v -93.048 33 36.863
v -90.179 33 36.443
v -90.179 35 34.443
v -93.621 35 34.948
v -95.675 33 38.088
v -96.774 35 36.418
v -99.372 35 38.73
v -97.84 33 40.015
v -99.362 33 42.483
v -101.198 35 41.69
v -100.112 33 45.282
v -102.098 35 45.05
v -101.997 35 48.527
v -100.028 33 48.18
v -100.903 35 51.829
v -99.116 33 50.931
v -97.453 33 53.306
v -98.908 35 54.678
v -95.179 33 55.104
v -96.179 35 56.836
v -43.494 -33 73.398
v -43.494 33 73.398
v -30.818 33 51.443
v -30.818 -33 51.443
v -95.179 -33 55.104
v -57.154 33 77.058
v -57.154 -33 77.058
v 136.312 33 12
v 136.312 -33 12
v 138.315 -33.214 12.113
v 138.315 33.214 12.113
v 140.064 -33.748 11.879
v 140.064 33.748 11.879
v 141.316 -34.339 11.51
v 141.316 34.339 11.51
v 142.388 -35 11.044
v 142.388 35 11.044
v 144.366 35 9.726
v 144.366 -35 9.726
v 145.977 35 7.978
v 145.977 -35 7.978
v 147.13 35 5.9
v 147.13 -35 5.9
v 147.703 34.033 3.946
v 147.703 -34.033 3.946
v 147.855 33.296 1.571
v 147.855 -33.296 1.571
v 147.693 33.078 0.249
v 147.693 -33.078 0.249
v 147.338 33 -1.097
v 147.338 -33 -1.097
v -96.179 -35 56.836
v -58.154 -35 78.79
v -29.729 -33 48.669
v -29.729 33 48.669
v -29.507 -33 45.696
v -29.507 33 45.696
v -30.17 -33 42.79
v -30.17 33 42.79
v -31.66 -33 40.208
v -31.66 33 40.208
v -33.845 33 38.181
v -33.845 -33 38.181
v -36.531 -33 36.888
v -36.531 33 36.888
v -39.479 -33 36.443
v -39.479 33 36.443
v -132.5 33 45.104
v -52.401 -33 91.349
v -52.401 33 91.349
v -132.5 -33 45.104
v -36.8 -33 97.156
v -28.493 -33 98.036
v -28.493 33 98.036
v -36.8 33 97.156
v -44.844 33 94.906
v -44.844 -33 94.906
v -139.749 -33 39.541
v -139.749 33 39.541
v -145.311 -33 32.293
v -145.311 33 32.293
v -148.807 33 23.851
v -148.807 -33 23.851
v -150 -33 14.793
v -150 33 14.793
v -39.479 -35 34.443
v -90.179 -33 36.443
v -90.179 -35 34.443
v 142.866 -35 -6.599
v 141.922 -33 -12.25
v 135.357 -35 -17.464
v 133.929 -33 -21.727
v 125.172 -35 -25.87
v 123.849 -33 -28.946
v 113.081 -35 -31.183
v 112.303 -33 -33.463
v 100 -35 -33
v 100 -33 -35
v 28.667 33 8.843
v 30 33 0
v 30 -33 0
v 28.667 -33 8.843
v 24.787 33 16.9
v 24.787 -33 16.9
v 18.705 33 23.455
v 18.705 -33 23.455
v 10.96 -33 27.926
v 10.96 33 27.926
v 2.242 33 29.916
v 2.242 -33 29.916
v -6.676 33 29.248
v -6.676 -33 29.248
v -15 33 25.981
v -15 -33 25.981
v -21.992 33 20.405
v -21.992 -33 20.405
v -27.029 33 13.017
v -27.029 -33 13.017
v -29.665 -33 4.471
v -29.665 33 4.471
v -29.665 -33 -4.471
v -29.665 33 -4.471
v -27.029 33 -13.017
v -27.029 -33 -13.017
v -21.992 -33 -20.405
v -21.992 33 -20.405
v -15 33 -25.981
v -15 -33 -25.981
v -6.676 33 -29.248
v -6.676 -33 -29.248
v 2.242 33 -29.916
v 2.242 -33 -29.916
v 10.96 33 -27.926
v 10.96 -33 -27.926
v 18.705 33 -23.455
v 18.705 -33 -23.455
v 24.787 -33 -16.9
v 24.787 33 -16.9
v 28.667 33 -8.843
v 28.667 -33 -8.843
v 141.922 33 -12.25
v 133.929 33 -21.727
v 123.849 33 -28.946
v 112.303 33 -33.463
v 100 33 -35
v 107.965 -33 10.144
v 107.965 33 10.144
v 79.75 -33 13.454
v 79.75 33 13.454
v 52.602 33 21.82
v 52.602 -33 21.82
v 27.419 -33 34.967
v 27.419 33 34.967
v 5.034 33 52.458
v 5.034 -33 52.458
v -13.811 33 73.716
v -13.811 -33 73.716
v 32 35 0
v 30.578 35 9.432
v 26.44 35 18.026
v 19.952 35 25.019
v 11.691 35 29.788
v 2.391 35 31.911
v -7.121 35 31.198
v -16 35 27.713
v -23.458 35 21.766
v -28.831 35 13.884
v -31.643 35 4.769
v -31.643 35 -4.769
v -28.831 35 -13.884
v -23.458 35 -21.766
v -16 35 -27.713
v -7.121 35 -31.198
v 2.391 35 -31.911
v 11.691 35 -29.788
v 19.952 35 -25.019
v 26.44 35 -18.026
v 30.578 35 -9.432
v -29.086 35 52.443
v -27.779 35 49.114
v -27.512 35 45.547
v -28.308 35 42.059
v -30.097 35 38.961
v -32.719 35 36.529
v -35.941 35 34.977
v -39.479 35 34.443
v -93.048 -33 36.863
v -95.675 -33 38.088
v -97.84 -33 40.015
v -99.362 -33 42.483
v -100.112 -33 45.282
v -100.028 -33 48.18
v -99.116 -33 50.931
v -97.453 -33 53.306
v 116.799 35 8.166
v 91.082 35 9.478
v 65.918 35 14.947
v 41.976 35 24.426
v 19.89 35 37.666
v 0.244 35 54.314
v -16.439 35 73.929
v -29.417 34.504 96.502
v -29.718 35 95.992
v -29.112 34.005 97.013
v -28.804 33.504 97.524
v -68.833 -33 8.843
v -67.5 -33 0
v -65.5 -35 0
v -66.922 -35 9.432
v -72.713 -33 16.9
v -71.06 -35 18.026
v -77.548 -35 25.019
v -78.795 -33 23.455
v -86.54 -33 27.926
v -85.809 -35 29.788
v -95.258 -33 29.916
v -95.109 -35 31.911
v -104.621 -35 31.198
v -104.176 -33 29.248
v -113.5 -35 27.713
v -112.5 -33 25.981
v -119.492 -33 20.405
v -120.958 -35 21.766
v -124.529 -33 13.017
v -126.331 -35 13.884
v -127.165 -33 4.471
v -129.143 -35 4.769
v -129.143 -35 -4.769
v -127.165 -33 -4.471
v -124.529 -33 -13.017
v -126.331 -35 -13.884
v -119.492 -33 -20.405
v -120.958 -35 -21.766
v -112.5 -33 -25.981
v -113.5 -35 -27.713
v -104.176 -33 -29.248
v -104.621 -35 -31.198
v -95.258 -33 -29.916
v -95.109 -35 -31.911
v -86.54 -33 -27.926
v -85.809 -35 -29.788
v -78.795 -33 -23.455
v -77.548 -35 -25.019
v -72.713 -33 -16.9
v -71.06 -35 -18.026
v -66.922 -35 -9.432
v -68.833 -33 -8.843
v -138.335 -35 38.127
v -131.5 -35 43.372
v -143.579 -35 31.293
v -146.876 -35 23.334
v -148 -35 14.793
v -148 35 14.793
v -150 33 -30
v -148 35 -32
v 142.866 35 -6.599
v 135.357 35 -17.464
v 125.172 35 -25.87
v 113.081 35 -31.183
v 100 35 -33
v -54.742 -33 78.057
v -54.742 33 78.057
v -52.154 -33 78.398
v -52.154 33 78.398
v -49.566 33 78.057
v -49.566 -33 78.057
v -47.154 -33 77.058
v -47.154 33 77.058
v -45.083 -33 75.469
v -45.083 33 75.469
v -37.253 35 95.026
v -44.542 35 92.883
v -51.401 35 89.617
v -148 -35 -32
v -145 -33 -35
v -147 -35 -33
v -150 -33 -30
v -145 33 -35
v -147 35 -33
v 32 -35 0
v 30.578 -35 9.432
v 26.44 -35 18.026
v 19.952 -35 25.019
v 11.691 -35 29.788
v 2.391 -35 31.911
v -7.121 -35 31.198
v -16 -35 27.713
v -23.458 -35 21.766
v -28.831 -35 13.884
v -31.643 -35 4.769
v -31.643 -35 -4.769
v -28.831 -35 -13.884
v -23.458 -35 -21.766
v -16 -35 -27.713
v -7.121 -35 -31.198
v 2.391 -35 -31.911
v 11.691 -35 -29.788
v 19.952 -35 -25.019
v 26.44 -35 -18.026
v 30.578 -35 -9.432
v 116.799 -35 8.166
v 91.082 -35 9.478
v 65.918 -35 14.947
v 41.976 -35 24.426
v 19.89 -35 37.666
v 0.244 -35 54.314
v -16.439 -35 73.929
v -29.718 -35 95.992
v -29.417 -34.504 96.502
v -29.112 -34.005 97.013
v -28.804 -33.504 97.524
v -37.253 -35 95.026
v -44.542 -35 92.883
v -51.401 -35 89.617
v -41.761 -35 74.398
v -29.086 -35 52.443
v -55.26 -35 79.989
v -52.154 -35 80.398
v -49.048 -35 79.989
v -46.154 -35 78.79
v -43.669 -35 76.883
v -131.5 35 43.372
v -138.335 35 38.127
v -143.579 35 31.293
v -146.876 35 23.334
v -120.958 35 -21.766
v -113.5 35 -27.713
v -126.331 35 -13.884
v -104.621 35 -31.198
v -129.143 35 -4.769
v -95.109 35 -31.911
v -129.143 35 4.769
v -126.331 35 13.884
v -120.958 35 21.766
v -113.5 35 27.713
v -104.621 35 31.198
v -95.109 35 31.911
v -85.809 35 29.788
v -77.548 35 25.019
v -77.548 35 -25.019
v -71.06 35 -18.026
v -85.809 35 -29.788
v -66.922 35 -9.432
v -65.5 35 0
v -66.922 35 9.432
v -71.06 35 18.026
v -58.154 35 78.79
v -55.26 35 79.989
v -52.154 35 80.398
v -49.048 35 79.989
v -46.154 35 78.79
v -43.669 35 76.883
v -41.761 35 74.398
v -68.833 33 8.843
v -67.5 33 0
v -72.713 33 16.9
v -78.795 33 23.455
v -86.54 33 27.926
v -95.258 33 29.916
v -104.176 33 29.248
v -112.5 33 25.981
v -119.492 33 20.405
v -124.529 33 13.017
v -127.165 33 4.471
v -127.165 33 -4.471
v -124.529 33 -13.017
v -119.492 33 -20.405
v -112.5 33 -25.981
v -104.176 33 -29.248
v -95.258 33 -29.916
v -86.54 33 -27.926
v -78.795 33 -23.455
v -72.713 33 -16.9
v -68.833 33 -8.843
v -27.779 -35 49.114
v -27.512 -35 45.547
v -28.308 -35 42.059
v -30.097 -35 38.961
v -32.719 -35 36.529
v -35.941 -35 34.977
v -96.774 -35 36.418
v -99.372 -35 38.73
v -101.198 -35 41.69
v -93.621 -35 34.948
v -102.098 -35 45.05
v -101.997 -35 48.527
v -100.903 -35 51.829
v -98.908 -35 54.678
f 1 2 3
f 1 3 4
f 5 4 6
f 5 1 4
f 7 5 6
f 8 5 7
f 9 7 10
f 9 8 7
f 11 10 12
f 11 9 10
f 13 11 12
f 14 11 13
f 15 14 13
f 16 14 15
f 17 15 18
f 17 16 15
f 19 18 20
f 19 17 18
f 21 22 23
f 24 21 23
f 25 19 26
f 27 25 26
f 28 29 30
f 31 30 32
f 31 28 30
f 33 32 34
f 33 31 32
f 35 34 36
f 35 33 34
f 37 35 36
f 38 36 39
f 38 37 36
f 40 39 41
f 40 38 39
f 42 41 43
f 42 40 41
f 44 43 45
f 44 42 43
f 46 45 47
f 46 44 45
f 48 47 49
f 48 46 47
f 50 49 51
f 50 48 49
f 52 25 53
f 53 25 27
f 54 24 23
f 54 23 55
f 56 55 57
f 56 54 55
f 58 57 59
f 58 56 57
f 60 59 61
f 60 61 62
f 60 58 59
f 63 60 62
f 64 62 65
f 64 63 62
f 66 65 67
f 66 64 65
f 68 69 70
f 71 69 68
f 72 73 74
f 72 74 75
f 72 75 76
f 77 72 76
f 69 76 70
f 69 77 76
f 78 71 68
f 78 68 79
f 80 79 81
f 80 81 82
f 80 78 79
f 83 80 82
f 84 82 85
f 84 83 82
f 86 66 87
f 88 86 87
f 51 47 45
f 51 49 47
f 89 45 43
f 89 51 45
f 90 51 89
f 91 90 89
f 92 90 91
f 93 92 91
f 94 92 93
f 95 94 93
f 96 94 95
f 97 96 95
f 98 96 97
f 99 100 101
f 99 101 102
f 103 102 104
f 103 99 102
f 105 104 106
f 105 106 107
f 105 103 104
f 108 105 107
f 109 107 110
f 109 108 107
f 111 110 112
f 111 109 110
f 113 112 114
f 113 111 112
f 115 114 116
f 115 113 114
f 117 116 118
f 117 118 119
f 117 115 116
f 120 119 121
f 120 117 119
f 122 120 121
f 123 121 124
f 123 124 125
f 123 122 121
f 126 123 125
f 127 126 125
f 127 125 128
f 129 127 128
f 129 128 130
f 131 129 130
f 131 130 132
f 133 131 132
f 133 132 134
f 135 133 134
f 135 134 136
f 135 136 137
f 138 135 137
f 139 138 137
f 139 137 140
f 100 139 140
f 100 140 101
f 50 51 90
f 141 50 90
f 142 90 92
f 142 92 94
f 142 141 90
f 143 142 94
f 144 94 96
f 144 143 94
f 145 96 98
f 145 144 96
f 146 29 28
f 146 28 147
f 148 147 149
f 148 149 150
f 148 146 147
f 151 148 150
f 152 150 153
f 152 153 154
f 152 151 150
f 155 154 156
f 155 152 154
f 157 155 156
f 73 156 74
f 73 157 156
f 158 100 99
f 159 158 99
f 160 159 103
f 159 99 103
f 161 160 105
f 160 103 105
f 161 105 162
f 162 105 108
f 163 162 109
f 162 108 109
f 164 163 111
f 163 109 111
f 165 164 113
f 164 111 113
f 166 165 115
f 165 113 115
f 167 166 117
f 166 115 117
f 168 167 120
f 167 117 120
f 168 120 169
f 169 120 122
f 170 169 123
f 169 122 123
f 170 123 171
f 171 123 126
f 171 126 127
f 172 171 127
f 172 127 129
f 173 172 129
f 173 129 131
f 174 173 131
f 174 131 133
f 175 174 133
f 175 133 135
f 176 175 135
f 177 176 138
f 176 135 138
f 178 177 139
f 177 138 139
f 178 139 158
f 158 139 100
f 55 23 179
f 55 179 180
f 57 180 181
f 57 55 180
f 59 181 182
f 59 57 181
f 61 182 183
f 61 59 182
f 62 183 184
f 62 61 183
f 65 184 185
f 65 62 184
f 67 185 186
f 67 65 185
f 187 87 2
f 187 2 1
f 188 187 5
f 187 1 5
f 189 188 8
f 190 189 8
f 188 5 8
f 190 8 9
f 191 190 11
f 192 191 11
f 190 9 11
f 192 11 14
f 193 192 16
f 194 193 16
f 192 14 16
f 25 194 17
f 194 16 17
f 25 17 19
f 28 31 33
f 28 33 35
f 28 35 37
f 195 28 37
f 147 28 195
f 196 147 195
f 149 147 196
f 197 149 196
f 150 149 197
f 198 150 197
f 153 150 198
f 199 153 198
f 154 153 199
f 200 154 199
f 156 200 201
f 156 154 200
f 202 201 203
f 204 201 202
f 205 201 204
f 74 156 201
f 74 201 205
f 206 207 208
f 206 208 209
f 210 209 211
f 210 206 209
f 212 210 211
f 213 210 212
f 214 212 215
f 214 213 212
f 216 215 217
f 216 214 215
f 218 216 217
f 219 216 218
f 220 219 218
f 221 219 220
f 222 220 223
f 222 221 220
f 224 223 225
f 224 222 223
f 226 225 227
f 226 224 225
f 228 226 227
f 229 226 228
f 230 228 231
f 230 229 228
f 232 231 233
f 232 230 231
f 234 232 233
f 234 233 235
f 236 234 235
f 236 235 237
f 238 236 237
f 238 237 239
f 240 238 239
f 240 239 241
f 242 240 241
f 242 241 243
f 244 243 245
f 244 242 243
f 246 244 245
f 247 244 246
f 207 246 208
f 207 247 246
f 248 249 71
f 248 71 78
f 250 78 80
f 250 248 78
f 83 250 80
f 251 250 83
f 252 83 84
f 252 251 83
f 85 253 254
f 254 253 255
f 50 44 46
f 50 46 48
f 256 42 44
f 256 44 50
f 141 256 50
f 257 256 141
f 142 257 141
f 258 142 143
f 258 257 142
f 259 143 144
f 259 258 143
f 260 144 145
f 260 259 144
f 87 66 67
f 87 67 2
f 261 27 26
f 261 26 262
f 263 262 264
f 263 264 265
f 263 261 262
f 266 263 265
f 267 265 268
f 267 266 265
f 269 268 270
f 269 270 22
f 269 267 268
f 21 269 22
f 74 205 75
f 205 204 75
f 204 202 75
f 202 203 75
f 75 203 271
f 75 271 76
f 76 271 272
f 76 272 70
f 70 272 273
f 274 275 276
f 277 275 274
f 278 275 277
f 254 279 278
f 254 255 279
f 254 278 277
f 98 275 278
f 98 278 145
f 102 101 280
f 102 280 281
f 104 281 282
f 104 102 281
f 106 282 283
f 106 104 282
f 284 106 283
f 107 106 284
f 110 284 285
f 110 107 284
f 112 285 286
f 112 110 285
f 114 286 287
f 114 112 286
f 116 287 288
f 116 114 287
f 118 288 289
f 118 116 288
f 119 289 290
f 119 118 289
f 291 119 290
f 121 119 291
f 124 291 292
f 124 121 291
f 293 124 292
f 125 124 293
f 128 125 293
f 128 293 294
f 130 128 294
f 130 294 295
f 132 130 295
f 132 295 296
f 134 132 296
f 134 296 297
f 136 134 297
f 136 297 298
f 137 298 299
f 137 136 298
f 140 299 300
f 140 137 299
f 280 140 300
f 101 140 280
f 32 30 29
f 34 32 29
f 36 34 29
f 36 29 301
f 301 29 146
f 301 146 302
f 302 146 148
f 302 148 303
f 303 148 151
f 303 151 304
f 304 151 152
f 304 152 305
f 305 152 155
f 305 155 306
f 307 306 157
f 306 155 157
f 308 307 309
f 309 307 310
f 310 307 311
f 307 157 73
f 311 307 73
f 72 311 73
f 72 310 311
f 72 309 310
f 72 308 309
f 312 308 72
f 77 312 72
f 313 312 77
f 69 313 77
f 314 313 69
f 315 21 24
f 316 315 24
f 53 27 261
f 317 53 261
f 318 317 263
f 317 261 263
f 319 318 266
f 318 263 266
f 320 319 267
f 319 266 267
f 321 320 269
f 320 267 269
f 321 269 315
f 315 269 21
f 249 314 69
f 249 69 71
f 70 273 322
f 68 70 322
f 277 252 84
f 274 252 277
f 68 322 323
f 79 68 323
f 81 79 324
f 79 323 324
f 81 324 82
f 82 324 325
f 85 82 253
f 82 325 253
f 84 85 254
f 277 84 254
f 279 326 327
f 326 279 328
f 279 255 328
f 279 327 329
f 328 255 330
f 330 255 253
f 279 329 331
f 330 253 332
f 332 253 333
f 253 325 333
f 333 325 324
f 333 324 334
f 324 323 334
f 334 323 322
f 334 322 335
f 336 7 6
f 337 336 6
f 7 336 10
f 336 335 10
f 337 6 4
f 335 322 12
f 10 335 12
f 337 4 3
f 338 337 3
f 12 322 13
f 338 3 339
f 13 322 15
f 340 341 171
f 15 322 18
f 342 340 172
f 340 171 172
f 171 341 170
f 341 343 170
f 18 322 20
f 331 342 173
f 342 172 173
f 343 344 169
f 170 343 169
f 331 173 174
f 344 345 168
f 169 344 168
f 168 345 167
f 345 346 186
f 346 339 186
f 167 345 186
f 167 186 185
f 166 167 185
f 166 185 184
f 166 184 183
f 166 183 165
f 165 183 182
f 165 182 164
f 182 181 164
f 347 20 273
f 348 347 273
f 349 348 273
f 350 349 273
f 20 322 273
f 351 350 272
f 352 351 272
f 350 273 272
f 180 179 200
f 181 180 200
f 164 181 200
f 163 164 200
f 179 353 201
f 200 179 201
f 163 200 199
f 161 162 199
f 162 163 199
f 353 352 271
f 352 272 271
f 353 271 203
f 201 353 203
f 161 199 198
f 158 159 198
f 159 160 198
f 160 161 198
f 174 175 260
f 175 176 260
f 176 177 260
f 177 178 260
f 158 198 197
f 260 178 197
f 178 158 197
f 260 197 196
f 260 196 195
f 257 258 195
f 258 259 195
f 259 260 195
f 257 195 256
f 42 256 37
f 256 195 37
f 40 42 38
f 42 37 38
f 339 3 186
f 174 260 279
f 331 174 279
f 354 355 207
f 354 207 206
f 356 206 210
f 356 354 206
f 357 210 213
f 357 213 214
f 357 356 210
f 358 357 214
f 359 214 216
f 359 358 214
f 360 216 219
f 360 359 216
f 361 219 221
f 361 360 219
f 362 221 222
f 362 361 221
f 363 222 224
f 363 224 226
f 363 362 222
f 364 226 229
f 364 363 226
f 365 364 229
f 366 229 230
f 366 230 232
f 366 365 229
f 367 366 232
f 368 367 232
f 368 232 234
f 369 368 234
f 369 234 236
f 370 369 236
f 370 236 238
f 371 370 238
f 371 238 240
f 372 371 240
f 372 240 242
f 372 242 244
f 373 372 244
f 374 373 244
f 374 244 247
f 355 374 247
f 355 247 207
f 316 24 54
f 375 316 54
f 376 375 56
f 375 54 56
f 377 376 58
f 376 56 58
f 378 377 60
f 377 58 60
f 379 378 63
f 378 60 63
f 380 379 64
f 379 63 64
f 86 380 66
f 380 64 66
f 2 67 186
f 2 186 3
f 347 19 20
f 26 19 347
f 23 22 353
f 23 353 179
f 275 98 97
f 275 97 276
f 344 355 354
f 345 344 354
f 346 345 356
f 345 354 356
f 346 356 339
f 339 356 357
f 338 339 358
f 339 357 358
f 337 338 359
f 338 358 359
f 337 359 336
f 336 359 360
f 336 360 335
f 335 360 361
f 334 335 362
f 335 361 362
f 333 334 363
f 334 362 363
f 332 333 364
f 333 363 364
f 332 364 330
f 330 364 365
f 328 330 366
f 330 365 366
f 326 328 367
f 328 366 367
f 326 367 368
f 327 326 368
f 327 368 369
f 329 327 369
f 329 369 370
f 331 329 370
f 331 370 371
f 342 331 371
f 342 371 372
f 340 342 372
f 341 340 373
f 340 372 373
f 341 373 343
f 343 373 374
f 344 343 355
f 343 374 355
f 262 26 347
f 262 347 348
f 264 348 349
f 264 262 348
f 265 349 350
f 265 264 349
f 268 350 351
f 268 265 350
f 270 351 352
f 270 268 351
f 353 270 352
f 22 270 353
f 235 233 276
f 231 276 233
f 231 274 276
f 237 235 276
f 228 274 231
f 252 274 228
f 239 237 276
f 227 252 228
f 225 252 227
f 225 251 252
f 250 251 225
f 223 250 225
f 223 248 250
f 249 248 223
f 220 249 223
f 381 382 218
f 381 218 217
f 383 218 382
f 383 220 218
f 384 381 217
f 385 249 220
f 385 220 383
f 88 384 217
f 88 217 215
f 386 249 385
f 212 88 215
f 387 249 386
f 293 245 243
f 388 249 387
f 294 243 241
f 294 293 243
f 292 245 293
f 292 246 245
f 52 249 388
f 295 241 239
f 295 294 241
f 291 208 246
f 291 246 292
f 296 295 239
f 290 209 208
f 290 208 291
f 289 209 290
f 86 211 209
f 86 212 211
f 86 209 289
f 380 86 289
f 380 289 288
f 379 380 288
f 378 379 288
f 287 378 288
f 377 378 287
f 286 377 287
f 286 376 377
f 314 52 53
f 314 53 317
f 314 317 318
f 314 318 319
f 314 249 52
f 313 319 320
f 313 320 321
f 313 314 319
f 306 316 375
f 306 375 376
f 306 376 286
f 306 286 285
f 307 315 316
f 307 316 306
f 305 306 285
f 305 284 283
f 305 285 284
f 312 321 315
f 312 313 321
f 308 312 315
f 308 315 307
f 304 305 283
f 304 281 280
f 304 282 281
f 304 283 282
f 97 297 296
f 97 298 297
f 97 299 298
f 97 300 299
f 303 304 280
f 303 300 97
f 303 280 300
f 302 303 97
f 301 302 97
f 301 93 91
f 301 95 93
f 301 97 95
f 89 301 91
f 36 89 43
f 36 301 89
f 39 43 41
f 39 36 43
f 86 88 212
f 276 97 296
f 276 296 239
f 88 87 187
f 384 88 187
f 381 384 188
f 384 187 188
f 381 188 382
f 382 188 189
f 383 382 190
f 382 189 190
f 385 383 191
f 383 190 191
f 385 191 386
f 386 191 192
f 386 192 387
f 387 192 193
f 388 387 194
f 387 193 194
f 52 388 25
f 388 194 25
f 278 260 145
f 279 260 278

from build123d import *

# Parameters (mm, degrees)
F0_R        = 30
F1_DEPTH    = 35
F2_T1_DEPTH = 320
F3_SIZE     = 2
F4_T1_DEPTH = 91.7168298797
F5_T1_DEPTH = 146.5537481792


# Not quite as in the source:
# - a fillet or chamfer that OpenCascade refuses, or shapes differently, is made with other operations: its cross-section is extruded or revolved along the edge and cut away or added


with BuildPart() as f1:
    # F0 (on Front) → F1 (new body, symmetric)
    with BuildSketch(Plane.XZ):
        with BuildLine():
            Line((-150, -35), (150, -35))
            Line((150, -35), (150, 14.7927405784))
            ThreePointArc((150, 14.7927405784), (45.9749646372, 24.7257009589), (-28.4932742745, 98.0356803447))
            ThreePointArc((-28.4932742745, 98.0356803447), (-40.8686708706, 96.1996481654), (-52.4008673876, 91.3488854864))
            Line((-52.4008673876, 91.3488854864), (-132.5, 45.1036297108))
            ThreePointArc((-132.5, 45.1036297108), (-145.3108891325, 32.2927405784), (-150, 14.7927405784))
            Line((-150, 14.7927405784), (-150, -35))
        make_face()
        with Locations((-97.5, 0)):
            Circle(F0_R, mode=Mode.SUBTRACT)
        Circle(F0_R, mode=Mode.SUBTRACT)
        with BuildLine():
            ThreePointArc((-90.1794919243, 36.443375673), (-99.8387501872, 43.8551852219), (-95.1794919243, 55.1036297108))
            Line((-95.1794919243, 55.1036297108), (-57.1537916494, 77.0577780006))
            ThreePointArc((-57.1537916494, 77.0577780006), (-49.5656011984, 78.0567822257), (-43.4935376116, 73.3975239628))
            Line((-43.4935376116, 73.3975239628), (-30.8183041866, 51.443375673))
            ThreePointArc((-30.8183041866, 51.443375673), (-30.8183041866, 41.443375673), (-39.4785582245, 36.443375673))
            Line((-39.4785582245, 36.443375673), (-90.1794919243, 36.443375673))
        make_face(mode=Mode.SUBTRACT)
    extrude(amount=F1_DEPTH, both=True)

    # F2: fillet of radius 50 on 1 edges, made by hand

    # F2_s2 → F2_t1 (cut)
    with BuildSketch(Plane.XZ.offset(-160)):
        with BuildLine():
            ThreePointArc((150, 15), (135.3553390593, -20.3553390593), (100, -35))
            Line((100, -35), (150, -35))
            Line((150, -35), (150, 15))
        make_face()
    extrude(amount=F2_T1_DEPTH, mode=Mode.SUBTRACT)

    # F3
    f3_edges = [f1.edges().sort_by_distance(p)[0] for p in [
        (135.281947, -35, -20.428579),
        (-25, -35, -35),
        (-150, -35, -10.10363),
        (-145.310889, -35, 32.292741),
        (-92.450434, -35, 68.226258),
        (-40.868671, -35, 96.199648),
        (45.974764, -35, 24.725795),
        (-127.5, -35, 0),
        (-30, -35, 0),
        (-99.83875, -35, 43.855185),
        (-64.829025, -35, 36.443376),
        (-76.166642, -35, 66.080704),
        (-30.818304, -35, 41.443376),
        (-49.565601, -35, 78.056782),
        (-37.155921, -35, 62.42045),
        (135.281947, 35, -20.428579),
        (-25, 35, -35),
        (-150, 35, -10.10363),
        (-145.310889, 35, 32.292741),
        (-92.450434, 35, 68.226258),
        (-40.868671, 35, 96.199648),
        (45.974764, 35, 24.725795),
        (-127.5, 35, 0),
        (-30, 35, 0),
        (-99.83875, 35, 43.855185),
        (-64.829025, 35, 36.443376),
        (-76.166642, 35, 66.080704),
        (-30.818304, 35, 41.443376),
        (-49.565601, 35, 78.056782),
        (-37.155921, 35, 62.42045),
    ]]
    chamfer(f3_edges, length=F3_SIZE)

    # F4: chamfer of 5 on 1 edges, made by hand

    # F4_s2 → F4_t1 (cut)
    with BuildSketch(Plane.XZ.offset(-45.8584149398)):
        Polygon((-145, -35), (-150, -30), (-150, -35), align=None)
    extrude(amount=F4_T1_DEPTH, mode=Mode.SUBTRACT)

    # F5: fillet of radius 10 on 1 edges, made by hand

    # F5_s2 → F5_t1 (cut)
    with BuildSketch(Plane.XZ.offset(-73.2768740896)):
        with BuildLine():
            ThreePointArc((136.3119389308, 12.0003957225), (145.5204541724, 8.5629129702), (147.338085728, -1.0967586678))
            ThreePointArc((147.338085728, -1.0967586678), (149.3130103908, 6.7400359449), (149.9995699858, 14.7926326161))
            ThreePointArc((149.9995699858, 14.7926326161), (143.1869943531, 13.243375245), (136.3119389308, 12.0003957225))
        make_face()
    extrude(amount=F5_T1_DEPTH, mode=Mode.SUBTRACT)


solid = f1.part
